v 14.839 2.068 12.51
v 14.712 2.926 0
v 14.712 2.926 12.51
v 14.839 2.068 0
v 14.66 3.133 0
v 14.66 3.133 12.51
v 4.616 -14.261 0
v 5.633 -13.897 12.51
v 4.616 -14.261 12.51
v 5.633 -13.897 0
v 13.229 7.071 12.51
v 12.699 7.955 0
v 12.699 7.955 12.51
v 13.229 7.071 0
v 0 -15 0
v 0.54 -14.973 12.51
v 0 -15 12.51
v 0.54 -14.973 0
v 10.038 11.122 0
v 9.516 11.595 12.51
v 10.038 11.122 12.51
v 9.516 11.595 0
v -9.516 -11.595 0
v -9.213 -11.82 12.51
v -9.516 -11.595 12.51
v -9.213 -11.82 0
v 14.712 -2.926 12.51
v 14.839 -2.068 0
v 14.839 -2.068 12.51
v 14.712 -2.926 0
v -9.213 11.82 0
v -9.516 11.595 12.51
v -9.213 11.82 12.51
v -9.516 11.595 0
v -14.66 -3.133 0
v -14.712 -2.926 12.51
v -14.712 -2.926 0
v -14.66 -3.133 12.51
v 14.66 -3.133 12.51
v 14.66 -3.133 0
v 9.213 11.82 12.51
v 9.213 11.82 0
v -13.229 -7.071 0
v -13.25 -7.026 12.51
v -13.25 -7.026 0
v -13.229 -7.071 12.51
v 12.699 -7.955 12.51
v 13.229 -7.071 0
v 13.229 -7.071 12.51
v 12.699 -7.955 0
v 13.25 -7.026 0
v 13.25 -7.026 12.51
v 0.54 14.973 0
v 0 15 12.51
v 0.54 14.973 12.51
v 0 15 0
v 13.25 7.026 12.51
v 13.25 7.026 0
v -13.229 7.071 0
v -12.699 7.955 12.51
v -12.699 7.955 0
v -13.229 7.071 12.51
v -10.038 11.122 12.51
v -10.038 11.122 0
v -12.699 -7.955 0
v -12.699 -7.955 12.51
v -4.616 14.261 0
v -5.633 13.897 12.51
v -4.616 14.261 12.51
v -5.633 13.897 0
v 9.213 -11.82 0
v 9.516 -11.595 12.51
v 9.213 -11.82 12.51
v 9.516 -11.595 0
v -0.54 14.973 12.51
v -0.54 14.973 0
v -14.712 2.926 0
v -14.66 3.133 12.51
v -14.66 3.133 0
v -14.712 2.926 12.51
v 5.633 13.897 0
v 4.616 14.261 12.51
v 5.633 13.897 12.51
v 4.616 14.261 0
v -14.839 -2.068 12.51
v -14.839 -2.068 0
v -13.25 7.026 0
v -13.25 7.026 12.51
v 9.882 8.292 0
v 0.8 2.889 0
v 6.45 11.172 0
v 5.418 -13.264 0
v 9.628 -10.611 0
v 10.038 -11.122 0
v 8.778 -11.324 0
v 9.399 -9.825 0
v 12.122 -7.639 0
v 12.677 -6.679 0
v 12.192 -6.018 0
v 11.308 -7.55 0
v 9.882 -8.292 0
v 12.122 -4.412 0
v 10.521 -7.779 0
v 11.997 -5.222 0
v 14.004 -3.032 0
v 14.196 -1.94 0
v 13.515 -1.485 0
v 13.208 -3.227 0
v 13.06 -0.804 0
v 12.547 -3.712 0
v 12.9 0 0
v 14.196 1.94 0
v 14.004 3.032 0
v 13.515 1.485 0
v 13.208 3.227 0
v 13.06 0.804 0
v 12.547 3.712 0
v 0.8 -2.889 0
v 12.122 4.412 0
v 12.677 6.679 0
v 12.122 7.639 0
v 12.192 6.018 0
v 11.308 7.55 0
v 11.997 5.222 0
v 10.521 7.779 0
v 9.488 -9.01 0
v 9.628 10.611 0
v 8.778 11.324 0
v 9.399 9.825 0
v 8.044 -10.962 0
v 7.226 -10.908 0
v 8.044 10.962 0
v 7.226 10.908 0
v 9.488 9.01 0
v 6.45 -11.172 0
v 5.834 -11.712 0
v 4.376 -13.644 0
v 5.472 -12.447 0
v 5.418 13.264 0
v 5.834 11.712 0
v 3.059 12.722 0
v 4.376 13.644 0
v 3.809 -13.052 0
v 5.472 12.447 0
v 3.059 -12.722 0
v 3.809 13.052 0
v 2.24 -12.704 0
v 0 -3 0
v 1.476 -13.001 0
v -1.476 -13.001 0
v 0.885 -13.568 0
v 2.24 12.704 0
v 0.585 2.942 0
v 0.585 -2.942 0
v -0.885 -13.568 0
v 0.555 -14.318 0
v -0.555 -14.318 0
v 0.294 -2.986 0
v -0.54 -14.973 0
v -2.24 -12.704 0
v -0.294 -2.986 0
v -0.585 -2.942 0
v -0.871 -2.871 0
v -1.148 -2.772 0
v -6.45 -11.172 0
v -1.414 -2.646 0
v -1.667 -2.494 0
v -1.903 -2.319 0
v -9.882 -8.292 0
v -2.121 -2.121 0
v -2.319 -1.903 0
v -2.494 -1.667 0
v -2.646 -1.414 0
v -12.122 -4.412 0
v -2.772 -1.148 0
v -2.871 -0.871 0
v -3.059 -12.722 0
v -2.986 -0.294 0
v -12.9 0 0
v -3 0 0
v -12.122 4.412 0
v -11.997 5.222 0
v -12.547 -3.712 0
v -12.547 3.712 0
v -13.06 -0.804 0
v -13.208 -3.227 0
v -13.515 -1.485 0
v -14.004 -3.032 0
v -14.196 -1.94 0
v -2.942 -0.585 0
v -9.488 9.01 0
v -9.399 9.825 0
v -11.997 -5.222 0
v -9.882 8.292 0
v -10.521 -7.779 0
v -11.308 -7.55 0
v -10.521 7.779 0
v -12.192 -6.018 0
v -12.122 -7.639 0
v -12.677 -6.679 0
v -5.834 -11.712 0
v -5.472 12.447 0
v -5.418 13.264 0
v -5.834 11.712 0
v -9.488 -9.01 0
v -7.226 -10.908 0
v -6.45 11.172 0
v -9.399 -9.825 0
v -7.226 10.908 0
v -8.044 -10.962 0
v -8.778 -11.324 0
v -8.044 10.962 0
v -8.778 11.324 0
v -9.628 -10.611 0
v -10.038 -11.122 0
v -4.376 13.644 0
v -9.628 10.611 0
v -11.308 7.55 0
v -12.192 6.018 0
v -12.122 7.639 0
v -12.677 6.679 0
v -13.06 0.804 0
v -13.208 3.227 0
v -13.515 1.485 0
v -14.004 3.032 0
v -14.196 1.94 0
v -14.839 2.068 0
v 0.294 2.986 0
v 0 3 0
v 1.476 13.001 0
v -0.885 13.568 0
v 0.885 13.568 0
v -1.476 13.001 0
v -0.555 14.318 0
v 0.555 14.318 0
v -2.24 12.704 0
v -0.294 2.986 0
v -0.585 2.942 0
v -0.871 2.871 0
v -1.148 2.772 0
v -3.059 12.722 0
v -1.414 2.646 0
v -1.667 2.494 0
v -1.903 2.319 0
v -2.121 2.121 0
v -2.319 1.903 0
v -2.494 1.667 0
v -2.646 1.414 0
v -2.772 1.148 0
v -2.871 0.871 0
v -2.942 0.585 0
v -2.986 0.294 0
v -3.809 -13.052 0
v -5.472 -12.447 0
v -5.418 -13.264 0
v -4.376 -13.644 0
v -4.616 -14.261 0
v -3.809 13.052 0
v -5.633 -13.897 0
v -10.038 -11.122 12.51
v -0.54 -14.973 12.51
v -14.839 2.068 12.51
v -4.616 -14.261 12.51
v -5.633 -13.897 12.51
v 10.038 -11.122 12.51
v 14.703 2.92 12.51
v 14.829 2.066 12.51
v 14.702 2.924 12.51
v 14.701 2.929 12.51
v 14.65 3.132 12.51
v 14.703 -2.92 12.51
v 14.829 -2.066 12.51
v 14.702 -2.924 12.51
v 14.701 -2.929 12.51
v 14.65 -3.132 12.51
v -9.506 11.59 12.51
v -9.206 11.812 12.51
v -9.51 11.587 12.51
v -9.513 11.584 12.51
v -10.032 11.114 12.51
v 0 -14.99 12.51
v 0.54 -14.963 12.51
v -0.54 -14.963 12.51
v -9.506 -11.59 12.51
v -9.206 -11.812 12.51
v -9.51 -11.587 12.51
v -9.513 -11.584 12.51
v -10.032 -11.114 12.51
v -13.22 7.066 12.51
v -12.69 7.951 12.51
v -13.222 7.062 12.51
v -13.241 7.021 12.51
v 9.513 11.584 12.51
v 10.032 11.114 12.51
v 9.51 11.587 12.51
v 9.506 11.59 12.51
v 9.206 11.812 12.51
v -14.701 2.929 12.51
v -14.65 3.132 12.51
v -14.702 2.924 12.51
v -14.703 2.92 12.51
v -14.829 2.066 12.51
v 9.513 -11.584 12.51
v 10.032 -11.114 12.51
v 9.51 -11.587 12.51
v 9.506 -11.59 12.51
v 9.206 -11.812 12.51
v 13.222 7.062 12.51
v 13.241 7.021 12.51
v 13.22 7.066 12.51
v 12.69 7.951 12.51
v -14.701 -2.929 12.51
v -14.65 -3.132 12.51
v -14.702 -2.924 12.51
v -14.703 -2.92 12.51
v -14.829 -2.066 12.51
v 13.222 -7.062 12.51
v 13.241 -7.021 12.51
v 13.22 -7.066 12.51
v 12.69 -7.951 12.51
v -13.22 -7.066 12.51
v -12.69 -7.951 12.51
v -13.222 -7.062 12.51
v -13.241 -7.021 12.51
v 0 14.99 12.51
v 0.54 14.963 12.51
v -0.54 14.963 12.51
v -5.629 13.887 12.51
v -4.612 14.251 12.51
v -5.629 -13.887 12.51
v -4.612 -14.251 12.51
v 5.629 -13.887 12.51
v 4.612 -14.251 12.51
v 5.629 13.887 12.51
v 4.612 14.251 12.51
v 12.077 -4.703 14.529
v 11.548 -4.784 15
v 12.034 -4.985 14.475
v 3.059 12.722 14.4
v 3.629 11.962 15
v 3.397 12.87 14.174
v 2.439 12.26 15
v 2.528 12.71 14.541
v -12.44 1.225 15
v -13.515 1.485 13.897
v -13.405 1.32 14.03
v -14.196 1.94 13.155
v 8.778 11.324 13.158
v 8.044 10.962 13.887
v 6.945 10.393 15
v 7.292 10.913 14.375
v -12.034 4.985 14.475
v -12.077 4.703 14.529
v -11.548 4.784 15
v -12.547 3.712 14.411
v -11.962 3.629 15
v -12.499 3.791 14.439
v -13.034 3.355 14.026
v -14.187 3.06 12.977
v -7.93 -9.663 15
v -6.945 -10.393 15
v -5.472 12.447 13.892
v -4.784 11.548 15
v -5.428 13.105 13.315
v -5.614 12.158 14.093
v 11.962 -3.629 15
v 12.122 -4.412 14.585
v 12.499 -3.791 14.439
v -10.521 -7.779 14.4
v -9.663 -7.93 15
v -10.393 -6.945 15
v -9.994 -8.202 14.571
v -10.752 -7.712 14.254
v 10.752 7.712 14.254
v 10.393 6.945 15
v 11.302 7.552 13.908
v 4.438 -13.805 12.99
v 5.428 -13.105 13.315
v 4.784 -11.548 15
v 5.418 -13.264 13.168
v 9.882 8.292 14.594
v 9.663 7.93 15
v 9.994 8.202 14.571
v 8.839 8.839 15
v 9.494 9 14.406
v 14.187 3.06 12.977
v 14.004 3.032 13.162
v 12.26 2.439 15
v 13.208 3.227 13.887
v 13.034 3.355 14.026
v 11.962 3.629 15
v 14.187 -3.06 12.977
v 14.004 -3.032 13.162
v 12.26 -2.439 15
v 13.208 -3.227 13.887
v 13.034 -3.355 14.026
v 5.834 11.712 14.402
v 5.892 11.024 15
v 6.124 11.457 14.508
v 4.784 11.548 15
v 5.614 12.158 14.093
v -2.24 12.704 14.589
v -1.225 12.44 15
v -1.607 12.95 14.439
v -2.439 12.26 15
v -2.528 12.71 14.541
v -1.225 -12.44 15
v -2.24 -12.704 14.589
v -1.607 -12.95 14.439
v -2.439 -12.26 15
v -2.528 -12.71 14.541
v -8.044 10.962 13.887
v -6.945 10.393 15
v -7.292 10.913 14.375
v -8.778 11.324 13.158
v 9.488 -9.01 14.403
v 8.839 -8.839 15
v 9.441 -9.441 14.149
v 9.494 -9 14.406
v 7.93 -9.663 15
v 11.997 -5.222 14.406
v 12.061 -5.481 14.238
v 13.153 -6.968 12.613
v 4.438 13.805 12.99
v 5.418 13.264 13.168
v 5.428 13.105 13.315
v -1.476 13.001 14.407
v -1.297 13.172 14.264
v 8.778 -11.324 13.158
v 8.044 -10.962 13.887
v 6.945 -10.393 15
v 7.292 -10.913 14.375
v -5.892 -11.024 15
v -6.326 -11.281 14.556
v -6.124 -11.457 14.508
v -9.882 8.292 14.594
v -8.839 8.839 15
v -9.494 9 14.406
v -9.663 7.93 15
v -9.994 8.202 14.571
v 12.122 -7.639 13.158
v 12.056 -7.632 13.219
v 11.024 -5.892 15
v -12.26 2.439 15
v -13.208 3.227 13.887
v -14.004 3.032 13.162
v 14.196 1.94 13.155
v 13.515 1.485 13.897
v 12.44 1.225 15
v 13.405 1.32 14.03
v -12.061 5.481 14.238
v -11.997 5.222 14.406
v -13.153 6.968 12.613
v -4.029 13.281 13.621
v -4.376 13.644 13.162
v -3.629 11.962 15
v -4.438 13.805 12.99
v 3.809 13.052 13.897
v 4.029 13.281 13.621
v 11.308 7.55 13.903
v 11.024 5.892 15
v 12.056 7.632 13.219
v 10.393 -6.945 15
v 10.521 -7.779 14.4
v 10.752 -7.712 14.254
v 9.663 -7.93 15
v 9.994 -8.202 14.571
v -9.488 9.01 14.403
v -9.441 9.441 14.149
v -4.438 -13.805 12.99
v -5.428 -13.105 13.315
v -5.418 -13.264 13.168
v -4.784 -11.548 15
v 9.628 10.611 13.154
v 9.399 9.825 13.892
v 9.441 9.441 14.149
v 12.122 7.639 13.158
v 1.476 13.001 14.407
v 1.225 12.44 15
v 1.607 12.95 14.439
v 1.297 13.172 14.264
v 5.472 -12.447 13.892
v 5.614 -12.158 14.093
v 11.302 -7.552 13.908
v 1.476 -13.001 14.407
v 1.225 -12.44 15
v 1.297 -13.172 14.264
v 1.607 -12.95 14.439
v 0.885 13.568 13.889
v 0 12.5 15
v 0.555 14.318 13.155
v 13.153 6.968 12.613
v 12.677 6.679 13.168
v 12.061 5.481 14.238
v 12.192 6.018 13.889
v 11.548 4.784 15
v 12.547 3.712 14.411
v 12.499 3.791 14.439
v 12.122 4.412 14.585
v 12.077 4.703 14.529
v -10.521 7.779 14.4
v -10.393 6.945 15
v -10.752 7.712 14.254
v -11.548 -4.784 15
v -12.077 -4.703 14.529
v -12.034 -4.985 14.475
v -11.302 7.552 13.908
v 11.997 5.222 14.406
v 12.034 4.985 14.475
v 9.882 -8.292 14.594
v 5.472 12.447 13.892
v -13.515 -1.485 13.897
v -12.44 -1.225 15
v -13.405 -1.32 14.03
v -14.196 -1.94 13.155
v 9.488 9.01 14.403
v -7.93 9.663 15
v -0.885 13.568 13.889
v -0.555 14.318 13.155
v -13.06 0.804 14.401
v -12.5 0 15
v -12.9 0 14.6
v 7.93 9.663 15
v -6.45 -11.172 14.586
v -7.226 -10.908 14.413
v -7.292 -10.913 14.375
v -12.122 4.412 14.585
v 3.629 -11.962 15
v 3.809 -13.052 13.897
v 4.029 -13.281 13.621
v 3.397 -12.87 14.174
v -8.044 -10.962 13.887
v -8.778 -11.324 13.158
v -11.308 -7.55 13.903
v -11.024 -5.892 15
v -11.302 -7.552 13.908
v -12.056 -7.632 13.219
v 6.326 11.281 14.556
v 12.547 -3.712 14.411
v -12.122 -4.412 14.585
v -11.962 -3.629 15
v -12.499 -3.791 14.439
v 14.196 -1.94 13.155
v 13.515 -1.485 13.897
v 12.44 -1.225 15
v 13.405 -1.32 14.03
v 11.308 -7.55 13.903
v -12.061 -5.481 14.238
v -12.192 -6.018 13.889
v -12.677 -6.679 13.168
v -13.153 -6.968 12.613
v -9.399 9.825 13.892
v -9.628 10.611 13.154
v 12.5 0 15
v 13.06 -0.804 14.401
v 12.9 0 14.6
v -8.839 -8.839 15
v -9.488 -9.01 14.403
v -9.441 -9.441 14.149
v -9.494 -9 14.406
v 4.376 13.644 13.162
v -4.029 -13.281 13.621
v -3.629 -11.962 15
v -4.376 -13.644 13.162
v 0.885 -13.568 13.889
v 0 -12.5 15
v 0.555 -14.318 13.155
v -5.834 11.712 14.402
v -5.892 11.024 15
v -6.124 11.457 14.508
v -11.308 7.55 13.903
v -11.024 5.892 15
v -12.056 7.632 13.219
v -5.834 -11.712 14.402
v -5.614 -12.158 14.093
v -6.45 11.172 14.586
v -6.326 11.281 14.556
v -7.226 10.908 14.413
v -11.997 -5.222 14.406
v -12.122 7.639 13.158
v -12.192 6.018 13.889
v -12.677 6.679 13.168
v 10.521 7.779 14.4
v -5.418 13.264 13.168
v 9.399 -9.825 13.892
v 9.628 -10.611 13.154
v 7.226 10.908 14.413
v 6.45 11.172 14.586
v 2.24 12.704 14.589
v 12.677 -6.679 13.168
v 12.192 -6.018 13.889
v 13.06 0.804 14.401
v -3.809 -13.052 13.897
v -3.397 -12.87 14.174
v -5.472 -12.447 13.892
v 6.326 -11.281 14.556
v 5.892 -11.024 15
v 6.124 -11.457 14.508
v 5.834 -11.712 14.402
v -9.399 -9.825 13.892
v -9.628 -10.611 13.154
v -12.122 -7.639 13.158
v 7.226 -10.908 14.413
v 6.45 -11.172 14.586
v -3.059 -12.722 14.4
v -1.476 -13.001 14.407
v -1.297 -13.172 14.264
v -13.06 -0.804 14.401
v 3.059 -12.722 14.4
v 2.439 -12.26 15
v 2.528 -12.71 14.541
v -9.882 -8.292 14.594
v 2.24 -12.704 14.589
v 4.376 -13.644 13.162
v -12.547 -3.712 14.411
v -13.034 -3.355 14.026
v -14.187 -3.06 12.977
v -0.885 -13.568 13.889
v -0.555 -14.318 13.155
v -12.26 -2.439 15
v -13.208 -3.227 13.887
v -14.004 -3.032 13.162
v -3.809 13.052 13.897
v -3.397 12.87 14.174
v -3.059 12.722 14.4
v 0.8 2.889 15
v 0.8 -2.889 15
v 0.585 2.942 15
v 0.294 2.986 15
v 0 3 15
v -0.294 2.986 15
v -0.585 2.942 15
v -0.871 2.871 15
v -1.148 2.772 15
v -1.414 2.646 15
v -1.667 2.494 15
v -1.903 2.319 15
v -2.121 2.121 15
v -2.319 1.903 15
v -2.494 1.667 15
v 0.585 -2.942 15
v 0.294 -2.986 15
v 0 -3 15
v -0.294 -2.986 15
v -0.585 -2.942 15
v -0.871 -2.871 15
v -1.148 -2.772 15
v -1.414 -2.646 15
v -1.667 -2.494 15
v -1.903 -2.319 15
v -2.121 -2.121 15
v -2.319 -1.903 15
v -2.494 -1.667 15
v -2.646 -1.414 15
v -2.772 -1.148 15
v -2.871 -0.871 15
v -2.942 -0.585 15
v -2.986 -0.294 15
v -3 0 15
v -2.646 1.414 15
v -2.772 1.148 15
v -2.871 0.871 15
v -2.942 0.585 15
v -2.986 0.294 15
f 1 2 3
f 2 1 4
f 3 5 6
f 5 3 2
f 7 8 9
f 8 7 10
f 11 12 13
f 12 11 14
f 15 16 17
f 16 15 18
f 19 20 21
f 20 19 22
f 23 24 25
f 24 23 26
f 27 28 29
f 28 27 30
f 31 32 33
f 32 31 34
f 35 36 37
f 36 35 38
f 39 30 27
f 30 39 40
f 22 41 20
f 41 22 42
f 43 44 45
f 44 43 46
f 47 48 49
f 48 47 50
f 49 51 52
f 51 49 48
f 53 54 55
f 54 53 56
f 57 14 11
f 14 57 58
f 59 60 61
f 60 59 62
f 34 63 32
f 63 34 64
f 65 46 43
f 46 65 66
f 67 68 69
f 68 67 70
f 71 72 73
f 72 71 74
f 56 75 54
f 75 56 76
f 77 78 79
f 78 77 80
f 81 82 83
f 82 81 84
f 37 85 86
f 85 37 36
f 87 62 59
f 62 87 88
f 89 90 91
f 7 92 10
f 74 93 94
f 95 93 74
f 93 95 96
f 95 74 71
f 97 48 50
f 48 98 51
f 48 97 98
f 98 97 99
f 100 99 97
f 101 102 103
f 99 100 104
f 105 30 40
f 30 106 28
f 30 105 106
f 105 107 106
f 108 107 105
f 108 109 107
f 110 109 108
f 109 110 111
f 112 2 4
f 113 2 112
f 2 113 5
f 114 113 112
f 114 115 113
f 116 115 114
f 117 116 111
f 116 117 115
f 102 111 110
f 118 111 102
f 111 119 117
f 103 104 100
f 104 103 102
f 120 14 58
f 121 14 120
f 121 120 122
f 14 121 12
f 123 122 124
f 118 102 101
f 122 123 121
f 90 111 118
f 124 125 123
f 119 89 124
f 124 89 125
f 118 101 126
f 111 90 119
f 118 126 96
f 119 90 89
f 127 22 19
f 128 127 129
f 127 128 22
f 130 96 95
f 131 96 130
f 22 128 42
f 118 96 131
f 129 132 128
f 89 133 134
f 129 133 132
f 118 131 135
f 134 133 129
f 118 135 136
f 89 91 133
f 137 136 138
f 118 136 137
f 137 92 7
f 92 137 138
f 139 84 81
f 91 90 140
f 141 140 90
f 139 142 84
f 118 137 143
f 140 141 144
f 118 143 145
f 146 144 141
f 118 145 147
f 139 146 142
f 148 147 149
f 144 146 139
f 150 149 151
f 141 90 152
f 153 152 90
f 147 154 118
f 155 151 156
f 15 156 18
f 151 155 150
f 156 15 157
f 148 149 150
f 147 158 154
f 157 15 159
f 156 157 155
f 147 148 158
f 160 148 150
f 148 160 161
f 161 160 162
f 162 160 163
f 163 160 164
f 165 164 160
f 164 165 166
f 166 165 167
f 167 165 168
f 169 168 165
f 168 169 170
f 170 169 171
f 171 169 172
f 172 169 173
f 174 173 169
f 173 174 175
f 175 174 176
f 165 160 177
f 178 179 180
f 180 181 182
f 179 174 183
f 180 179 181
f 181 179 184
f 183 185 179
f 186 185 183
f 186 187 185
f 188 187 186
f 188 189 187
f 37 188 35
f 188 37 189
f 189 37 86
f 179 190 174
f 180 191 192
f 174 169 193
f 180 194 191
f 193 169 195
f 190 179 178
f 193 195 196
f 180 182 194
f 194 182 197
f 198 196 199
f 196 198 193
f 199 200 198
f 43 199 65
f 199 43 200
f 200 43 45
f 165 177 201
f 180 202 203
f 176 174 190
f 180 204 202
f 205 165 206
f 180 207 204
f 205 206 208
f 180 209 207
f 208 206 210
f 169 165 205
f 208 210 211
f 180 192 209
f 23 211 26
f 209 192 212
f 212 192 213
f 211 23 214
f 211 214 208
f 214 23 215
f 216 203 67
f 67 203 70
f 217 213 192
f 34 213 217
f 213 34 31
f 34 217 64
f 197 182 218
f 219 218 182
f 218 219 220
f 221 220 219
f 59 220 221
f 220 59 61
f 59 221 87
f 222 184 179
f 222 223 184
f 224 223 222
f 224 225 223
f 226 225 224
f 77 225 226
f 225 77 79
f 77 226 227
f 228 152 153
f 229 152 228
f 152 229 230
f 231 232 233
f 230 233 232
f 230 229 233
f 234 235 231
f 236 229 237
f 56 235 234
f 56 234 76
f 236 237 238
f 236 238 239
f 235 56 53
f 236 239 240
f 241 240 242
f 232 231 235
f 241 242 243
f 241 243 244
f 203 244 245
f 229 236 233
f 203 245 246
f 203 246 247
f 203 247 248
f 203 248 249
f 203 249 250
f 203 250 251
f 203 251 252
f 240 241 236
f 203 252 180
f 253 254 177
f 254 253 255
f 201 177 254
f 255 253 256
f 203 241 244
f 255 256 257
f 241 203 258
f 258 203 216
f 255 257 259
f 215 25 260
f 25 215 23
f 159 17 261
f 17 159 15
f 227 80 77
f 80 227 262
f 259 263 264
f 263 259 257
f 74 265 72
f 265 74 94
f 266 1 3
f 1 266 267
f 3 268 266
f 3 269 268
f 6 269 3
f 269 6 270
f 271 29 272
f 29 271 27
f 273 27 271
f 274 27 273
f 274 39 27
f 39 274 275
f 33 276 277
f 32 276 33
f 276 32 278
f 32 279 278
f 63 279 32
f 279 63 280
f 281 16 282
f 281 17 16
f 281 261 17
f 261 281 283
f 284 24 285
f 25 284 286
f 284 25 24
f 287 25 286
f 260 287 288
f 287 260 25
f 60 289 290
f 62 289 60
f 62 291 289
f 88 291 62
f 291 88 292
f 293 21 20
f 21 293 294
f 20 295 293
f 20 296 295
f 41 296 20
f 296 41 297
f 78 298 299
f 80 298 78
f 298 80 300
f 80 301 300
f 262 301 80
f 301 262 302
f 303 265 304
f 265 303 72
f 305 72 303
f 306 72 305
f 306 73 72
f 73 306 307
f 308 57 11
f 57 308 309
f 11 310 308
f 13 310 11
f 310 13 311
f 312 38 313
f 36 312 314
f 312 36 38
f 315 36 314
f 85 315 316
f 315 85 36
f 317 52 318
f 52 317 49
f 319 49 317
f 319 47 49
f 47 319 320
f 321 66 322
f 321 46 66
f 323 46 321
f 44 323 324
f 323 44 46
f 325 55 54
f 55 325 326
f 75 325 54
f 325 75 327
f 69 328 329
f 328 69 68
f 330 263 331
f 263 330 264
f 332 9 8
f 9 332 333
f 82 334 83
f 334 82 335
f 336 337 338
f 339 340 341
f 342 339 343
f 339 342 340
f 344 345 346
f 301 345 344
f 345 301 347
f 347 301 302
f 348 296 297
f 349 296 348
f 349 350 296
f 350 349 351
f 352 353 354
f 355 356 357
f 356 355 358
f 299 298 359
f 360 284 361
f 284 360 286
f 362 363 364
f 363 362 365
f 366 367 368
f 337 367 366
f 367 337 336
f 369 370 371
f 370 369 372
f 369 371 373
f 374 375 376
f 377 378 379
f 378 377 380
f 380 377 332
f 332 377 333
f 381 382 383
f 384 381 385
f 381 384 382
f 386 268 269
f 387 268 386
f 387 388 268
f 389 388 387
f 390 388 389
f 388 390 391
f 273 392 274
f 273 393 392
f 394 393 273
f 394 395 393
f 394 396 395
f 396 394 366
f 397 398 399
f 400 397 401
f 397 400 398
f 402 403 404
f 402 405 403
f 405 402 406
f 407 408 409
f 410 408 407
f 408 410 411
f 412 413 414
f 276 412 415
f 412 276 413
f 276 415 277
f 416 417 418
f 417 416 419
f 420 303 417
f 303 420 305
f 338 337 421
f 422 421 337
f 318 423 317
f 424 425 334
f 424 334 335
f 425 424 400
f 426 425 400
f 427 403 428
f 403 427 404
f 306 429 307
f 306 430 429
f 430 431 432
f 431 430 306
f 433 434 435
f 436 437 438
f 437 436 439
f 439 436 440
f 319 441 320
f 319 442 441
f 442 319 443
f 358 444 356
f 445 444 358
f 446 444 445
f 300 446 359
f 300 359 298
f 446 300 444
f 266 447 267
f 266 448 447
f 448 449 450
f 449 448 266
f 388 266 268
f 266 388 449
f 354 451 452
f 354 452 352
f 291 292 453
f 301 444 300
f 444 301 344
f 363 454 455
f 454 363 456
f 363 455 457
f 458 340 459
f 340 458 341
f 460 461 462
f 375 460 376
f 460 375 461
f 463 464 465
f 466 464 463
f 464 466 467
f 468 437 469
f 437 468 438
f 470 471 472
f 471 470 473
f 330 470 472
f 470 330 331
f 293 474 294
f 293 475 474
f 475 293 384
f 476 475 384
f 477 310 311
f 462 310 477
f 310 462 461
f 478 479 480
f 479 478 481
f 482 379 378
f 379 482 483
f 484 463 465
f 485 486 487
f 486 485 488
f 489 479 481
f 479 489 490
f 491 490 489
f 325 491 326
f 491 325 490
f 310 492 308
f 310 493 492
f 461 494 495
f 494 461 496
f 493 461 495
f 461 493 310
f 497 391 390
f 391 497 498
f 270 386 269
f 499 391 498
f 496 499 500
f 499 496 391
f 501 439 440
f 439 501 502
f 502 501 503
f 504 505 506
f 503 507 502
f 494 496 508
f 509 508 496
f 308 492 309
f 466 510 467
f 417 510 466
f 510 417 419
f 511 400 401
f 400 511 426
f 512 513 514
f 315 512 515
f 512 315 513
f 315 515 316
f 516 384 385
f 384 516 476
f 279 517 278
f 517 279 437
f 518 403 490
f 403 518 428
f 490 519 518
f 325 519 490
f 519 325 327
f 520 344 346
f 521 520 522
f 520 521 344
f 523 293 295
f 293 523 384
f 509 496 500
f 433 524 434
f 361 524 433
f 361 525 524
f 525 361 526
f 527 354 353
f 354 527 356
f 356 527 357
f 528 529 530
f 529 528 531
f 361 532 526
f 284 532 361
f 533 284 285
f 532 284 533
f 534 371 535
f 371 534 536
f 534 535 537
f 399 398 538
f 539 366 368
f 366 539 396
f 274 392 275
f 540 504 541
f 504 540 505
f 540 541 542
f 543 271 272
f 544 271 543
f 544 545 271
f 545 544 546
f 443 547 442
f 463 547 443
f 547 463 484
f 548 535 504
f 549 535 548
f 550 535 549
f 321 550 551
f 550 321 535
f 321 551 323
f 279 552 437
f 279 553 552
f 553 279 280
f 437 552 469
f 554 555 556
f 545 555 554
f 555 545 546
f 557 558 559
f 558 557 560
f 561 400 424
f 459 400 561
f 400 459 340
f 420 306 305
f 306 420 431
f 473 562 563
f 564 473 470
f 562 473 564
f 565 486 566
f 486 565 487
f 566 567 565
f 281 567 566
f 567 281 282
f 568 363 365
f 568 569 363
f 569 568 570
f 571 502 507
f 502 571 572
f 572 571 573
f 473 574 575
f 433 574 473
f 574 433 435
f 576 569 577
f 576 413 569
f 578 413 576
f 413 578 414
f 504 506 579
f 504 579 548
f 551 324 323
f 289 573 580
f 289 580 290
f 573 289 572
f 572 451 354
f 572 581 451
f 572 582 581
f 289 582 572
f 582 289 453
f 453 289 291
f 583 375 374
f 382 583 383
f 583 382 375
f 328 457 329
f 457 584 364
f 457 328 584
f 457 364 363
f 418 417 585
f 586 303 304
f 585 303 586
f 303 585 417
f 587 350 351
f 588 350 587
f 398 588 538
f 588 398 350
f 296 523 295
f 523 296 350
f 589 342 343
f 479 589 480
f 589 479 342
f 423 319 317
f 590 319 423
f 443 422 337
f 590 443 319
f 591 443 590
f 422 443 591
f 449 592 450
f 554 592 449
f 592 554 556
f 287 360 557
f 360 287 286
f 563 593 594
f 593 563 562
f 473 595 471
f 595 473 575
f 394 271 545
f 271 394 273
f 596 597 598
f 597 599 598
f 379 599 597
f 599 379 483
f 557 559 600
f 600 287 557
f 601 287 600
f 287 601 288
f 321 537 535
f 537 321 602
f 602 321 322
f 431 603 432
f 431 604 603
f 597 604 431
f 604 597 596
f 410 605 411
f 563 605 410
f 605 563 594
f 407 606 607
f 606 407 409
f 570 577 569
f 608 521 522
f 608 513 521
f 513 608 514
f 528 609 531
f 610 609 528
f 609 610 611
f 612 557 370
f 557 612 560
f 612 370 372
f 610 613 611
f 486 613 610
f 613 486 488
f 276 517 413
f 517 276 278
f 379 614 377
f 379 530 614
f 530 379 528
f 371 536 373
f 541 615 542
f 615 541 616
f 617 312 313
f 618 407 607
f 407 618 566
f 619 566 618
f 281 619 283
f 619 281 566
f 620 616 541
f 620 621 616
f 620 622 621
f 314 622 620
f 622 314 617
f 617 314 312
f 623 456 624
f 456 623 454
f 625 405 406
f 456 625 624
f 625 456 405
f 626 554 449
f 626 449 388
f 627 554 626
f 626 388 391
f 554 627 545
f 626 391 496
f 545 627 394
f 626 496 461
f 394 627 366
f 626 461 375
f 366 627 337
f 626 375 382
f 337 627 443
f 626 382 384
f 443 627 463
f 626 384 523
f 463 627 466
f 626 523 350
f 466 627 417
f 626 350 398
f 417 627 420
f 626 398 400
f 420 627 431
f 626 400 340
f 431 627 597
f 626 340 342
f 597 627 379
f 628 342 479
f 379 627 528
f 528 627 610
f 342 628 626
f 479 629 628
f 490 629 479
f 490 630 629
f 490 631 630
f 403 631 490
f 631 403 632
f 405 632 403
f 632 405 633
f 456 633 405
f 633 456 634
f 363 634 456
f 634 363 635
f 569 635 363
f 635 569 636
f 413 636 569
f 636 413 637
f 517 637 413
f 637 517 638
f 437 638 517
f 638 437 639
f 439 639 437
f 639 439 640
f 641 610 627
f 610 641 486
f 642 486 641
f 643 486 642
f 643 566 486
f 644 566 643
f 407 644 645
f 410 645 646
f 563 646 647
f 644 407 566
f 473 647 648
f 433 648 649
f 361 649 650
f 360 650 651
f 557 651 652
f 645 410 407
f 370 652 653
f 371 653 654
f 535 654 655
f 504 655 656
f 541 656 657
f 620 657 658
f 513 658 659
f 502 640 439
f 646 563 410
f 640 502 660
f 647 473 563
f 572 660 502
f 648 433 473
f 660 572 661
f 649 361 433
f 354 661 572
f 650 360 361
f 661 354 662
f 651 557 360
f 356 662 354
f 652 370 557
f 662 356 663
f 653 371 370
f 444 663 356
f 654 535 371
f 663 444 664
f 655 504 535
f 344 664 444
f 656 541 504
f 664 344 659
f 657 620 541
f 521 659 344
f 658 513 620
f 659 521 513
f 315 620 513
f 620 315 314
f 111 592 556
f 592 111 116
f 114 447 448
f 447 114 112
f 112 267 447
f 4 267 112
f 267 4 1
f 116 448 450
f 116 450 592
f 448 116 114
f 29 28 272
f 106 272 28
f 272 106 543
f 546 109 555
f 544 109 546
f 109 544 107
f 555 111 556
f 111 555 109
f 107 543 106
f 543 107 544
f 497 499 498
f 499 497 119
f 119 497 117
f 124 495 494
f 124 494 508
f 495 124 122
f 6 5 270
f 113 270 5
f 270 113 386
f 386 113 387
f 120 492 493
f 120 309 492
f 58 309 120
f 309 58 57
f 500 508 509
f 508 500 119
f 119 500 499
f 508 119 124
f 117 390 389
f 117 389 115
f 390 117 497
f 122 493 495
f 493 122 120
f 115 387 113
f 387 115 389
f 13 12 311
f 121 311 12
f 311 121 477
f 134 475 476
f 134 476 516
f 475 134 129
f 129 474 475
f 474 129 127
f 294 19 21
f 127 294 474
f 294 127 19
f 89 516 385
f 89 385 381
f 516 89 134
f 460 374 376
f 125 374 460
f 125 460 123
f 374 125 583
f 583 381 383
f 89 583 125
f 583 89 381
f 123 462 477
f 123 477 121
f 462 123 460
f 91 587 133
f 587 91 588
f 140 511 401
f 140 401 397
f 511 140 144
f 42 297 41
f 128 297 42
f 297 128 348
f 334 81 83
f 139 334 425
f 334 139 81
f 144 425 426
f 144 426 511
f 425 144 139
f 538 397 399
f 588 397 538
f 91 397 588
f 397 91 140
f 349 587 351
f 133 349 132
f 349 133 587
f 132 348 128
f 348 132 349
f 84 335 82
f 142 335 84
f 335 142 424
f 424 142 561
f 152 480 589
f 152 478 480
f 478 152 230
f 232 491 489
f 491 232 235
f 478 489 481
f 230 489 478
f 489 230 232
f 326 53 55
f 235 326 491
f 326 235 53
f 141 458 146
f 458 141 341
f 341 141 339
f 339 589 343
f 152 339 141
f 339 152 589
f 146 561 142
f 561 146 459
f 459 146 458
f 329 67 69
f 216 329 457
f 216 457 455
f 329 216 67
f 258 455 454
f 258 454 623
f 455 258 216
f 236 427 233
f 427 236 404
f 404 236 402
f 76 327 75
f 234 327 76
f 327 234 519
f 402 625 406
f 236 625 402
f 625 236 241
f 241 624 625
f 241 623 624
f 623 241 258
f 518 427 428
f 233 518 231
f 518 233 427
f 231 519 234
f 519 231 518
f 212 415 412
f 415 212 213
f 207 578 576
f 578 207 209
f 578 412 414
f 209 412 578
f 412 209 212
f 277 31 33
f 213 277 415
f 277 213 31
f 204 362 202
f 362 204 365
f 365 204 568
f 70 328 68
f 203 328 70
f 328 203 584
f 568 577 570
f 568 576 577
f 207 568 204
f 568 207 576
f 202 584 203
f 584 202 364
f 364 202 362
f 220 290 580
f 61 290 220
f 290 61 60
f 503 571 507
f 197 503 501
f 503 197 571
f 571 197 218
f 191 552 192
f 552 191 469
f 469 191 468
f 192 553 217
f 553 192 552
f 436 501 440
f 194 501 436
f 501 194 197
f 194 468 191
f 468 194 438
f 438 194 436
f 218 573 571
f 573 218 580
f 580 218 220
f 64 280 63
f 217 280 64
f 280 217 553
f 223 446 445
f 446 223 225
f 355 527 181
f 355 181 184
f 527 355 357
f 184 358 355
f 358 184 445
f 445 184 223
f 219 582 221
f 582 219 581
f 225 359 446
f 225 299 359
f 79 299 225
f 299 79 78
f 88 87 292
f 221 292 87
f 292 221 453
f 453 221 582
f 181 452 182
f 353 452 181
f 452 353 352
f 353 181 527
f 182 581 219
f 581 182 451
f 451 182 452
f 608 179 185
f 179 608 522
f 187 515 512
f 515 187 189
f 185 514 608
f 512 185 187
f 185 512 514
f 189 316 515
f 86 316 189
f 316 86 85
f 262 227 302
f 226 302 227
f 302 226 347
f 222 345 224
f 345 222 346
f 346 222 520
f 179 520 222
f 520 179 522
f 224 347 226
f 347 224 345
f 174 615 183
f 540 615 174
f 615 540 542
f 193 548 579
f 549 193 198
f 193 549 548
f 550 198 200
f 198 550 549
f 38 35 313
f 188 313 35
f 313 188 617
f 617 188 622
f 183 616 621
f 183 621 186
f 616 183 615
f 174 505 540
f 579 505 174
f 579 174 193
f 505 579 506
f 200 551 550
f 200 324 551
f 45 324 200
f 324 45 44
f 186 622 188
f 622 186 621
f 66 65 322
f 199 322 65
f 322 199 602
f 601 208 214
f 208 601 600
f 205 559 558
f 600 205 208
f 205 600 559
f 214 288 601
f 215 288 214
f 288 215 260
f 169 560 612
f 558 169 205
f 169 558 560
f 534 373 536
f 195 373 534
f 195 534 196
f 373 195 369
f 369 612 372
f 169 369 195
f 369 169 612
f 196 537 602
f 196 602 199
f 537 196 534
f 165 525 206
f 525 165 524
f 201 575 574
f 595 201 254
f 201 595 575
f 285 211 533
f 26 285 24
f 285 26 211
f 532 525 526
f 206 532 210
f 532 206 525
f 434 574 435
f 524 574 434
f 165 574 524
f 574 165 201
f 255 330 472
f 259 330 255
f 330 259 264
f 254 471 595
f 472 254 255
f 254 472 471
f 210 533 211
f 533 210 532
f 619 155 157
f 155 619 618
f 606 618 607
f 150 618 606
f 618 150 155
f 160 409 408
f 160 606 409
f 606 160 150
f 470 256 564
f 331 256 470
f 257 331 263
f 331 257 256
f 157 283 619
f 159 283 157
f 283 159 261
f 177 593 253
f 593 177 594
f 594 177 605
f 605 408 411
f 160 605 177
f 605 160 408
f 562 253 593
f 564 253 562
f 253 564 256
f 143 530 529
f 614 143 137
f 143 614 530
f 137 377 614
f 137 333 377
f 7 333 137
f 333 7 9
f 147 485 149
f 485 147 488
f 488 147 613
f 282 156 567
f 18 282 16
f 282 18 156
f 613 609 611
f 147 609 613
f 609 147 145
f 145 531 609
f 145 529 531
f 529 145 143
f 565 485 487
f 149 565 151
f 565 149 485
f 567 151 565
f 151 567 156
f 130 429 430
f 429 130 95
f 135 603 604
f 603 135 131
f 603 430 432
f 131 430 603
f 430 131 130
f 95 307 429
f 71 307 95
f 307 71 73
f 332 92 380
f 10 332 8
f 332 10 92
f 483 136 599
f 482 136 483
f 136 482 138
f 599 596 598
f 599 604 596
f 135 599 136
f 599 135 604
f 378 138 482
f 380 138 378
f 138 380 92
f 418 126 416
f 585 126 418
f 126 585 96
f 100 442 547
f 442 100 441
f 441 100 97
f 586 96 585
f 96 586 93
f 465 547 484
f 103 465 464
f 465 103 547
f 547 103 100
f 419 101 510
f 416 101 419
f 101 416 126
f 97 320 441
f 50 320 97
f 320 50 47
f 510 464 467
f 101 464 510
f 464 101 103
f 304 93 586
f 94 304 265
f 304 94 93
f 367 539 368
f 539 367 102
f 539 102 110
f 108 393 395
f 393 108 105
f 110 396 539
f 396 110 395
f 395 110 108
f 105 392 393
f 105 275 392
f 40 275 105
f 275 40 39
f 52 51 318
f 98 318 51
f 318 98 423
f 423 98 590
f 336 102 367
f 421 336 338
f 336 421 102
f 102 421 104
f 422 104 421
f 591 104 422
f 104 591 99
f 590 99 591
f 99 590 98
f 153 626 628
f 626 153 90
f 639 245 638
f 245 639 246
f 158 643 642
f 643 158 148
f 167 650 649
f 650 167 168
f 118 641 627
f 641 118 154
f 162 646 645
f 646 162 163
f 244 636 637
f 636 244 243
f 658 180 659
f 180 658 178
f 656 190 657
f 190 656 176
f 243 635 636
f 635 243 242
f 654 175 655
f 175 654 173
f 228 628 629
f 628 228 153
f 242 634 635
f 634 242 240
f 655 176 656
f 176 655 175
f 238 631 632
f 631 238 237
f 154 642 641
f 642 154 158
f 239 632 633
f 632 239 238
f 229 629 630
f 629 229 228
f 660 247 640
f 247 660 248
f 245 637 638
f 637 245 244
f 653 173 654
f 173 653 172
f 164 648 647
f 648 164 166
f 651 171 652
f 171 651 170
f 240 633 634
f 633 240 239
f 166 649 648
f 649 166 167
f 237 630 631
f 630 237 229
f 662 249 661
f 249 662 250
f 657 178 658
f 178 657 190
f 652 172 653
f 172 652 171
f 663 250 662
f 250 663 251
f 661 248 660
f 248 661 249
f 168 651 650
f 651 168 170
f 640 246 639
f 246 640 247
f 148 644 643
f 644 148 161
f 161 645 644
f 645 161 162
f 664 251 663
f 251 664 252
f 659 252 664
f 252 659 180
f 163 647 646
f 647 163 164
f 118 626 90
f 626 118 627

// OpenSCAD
// Knurled control knob - a cylindrical knob with a ring of grip flutes, a chamfered top edge, and a
// shaft bore with an optional flat (D-bore). Teaches a coarse surface texture, an edge chamfer, and
// a D-bore via intersection(). NOVEL general part.
//
// @desc fluted (knurled) knob with a chamfered top and a D-bore
// @prompt Design a control knob in OpenSCAD: {d} mm across and {h} mm tall with {flutes} grip flutes around the rim, a chamfered top edge, and a {bore} mm shaft bore with a flat {flat} mm deep. Reply with a single complete OpenSCAD file.
// @param d      knob diameter, mm      [18:50]
// @param h      knob height, mm        [12:30]
// @param flutes number of flutes       [8:18:1]
// @param bore   shaft bore, mm         [4:10]
// @param flat   shaft flat depth, mm   [0:3]

d      = 30;
h      = 15;
flutes = 18;
bore   = 6;
flat   = 3;

$fn = 64;

chamf = min(2.5, h / 4);
fd    = d * 0.14;                 // flute-cutter diameter
fl    = min(flat, bore / 2 - 0.8); // keep the D-flat shallower than the bore radius

difference() {
    union() {
        cylinder(h = h - chamf + 0.01, d = d);                                          // body
        translate([0, 0, h - chamf]) cylinder(h = chamf, d1 = d, d2 = d - 2 * chamf);   // chamfered top
    }
    for (i = [0 : flutes - 1])                                                           // grip flutes
        rotate([0, 0, i * 360 / flutes])
            translate([d / 2, 0, -1]) cylinder(h = h + 2, d = fd, $fn = 16);
    translate([0, 0, -1]) intersection() {                                              // shaft bore, D-flat on +x
        cylinder(h = h + 2, d = bore);
        translate([-d, -d, 0]) cube([d + bore / 2 - fl, 2 * d, h + 2]);
    }
}
